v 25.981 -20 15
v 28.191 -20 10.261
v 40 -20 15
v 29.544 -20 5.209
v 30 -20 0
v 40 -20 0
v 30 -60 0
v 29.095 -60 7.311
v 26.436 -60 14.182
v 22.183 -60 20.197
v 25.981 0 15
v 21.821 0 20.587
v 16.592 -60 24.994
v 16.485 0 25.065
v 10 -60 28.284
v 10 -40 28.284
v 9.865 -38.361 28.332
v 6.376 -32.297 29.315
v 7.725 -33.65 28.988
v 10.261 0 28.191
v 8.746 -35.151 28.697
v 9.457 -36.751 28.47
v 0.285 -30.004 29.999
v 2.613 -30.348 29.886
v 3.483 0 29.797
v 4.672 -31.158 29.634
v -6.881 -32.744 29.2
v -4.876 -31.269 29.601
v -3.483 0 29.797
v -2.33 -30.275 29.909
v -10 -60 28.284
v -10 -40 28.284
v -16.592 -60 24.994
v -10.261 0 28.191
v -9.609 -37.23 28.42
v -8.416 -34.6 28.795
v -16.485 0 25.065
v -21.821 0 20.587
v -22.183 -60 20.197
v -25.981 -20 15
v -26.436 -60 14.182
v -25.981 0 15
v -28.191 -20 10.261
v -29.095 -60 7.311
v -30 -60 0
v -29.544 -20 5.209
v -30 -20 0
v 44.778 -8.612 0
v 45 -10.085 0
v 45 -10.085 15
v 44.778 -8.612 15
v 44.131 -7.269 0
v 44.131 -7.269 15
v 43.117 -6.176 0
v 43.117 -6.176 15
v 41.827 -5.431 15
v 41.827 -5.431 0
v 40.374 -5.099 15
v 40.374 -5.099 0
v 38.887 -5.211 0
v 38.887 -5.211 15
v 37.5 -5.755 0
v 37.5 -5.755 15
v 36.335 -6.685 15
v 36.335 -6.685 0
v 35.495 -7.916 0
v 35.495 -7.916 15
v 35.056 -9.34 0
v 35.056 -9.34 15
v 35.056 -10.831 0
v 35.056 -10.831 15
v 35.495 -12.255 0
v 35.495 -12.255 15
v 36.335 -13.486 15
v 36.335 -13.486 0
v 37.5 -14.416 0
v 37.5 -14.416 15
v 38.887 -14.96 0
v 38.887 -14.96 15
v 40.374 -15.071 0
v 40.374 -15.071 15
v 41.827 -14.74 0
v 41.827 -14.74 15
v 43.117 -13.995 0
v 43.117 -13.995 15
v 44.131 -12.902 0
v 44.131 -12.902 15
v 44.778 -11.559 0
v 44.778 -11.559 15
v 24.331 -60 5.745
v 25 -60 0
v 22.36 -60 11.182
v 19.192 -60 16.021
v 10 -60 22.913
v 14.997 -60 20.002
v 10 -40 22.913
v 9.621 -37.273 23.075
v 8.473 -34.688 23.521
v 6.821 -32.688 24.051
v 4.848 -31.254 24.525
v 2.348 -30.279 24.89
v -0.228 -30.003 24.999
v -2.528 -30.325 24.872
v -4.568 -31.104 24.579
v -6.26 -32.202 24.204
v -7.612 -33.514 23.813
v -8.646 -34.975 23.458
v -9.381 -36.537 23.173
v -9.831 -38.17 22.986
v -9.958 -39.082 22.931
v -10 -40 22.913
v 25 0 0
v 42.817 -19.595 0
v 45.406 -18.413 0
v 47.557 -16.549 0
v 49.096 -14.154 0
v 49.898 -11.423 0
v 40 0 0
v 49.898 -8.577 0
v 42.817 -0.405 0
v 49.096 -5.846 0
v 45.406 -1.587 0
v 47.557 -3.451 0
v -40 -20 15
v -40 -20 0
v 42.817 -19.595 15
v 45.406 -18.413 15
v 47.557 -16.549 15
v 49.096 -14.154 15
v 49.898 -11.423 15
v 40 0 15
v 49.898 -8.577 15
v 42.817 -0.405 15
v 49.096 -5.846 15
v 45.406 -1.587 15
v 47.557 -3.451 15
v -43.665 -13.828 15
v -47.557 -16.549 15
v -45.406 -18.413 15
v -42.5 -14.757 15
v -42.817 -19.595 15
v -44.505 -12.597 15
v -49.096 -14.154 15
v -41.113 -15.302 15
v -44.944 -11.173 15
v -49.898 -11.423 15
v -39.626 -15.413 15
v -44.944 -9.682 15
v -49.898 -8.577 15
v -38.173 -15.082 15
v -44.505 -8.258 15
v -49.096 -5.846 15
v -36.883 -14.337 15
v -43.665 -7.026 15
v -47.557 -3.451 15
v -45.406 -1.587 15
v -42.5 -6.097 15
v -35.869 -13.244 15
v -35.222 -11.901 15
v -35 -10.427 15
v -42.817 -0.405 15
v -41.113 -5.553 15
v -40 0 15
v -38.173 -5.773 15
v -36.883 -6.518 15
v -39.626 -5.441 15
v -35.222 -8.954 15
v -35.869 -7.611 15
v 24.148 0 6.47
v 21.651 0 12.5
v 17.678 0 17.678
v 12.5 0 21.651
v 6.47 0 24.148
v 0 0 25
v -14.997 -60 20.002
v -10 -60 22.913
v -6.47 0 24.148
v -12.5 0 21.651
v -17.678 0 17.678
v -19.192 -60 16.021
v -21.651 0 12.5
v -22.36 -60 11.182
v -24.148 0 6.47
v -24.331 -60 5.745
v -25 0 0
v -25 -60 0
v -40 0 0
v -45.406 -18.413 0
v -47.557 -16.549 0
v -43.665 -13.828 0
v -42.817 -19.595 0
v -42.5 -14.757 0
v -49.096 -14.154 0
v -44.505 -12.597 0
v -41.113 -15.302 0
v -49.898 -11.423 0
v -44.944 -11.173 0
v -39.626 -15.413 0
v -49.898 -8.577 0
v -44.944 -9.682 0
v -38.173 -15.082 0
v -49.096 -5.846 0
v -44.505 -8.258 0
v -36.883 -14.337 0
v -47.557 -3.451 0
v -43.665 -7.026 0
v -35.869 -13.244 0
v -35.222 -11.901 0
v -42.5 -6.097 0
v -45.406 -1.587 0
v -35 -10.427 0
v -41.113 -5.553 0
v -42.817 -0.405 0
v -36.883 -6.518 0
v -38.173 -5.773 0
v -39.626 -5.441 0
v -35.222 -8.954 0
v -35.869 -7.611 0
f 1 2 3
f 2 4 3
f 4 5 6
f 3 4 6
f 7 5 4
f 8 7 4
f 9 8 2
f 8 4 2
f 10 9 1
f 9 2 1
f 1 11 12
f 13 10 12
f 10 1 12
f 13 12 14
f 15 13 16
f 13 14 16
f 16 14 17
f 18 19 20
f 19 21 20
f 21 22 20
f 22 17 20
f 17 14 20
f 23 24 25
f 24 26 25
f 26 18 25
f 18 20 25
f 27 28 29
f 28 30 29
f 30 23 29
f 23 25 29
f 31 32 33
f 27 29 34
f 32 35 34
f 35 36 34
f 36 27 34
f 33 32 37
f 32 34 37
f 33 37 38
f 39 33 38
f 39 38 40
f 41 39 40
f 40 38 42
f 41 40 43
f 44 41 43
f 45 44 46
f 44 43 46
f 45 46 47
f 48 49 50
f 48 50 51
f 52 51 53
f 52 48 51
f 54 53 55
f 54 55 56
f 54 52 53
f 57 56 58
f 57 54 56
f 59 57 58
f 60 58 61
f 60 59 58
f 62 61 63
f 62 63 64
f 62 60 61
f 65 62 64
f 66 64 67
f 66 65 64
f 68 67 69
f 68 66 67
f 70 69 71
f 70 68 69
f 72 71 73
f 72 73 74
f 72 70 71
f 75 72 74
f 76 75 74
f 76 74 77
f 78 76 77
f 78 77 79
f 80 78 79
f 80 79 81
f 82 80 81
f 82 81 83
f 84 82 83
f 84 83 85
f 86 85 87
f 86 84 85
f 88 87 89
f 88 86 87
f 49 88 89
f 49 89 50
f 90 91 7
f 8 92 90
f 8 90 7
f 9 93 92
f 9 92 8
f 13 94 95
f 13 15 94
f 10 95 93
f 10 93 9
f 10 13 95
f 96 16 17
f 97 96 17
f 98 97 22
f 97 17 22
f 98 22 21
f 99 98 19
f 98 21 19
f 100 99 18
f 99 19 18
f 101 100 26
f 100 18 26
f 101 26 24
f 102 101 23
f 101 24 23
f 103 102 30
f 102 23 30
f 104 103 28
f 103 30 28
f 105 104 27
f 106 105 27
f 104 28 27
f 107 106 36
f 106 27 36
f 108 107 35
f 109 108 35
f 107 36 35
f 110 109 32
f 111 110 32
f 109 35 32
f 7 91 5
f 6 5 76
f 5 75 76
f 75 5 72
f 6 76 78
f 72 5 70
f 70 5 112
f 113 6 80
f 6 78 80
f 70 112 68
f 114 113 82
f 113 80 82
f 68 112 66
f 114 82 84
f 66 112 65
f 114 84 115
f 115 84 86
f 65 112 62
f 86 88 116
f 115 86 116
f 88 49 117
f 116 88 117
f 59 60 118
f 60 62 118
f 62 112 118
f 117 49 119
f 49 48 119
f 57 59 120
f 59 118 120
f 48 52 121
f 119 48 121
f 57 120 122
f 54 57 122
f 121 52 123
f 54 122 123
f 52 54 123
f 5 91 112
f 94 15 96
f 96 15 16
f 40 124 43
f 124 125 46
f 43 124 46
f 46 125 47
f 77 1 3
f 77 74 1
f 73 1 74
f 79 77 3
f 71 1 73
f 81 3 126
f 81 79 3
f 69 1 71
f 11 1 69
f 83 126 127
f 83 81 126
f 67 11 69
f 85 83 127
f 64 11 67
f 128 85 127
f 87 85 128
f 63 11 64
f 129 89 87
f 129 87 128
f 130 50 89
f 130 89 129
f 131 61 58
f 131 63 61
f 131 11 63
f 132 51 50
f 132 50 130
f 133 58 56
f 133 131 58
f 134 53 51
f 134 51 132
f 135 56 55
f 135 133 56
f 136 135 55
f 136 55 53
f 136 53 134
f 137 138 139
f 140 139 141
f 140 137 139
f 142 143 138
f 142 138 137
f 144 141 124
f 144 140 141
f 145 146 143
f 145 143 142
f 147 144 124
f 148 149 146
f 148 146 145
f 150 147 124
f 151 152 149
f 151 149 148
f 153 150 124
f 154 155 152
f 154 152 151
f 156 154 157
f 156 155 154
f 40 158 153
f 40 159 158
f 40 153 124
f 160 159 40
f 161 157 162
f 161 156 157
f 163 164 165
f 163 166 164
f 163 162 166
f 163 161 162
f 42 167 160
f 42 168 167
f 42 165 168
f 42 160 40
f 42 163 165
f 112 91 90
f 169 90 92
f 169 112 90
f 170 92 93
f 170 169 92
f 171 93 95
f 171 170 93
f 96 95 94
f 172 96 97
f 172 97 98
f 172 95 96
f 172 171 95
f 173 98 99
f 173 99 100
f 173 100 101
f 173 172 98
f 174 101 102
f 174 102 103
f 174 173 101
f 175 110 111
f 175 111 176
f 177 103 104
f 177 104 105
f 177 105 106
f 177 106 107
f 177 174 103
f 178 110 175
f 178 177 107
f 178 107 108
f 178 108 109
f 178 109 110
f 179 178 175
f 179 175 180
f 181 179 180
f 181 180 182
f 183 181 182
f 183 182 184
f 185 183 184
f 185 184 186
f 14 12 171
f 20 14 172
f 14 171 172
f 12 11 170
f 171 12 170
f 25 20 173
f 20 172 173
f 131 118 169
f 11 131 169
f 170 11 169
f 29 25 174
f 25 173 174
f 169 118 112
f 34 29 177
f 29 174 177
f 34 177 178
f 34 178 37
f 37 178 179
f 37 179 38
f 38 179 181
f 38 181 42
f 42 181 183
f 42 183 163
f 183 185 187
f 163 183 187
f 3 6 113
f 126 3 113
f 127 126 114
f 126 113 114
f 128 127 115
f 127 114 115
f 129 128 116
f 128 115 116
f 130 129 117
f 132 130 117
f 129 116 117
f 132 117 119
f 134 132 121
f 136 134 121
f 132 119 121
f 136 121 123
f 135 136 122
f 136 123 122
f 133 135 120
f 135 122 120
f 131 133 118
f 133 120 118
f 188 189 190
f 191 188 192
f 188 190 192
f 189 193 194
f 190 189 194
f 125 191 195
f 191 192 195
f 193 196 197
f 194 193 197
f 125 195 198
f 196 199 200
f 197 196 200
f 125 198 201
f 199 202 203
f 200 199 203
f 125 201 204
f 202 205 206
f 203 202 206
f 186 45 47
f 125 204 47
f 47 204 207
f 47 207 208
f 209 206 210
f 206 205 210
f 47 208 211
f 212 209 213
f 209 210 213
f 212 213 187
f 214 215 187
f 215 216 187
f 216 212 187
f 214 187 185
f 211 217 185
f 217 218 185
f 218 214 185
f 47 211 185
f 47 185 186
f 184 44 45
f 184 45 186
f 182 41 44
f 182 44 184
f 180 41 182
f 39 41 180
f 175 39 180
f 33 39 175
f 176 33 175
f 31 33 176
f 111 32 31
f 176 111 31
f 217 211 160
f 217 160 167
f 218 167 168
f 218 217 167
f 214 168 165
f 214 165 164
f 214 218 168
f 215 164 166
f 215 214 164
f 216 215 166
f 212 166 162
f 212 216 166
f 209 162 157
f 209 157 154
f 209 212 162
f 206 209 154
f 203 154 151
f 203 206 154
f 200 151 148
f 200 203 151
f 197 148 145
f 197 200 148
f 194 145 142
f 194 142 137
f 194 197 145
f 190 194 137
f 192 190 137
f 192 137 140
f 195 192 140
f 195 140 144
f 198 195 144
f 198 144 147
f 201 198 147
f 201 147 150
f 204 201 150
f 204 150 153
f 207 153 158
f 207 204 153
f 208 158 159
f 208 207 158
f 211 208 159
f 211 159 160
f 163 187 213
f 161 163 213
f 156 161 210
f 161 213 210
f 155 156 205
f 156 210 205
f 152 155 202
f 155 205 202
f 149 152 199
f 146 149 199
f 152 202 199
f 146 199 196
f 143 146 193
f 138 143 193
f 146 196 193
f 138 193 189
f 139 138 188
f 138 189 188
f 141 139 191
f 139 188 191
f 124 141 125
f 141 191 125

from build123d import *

# Parameters (mm, degrees)
F2_DEPTH  = 60
F4_DEPTH  = 15
F6_DEPTH  = 60.001
F9_DEPTH  = 30.001
F10_R     = 5
F11_DEPTH = 15


with BuildPart() as f2:
    # F1 (on Front) → F2 (new body)
    with BuildSketch(Plane.XZ):
        with BuildLine():
            ThreePointArc((30, 0), (0, 30), (-30, 0))
            Line((-30, 0), (30, 0))
        make_face()
    extrude(amount=F2_DEPTH)

    # F3 (on Top) → F4 (join)
    with BuildSketch(Plane.XY):
        with BuildLine():
            Line((40, 0), (-40, 0))
            ThreePointArc((-40, 0), (-50, -10), (-40, -20))
            Line((-40, -20), (40, -20))
            ThreePointArc((40, -20), (50, -10), (40, 0))
        make_face()
    extrude(amount=F4_DEPTH)

    # F5 (on Front) → F6 (cut, through all)
    with BuildSketch(Plane.XZ):
        with BuildLine():
            ThreePointArc((25, 0), (0, 25), (-25, 0))
            Line((-25, 0), (25, 0))
        make_face()
    extrude(amount=F6_DEPTH, mode=Mode.SUBTRACT)

    # F8 (on offset) → F9 (cut, through all)
    with BuildSketch(Plane.XY.offset(30)):
        with BuildLine():
            Line((-10, -60), (0, -60))
            Line((0, -60), (10, -60))
            Line((10, -60), (10, -40))
            ThreePointArc((10, -40), (0, -30), (-10, -40))
            Line((-10, -40), (-10, -60))
        make_face()
    extrude(amount=-F9_DEPTH, mode=Mode.SUBTRACT)

    # F10 (on Top) → F11 (cut, through all)
    with BuildSketch(Plane.XY):
        with Locations((-40, -10.4273502391)):
            Circle(F10_R)
        with Locations((40, -10.0854694971)):
            Circle(F10_R)
    extrude(amount=F11_DEPTH, mode=Mode.SUBTRACT)


solid = f2.part
